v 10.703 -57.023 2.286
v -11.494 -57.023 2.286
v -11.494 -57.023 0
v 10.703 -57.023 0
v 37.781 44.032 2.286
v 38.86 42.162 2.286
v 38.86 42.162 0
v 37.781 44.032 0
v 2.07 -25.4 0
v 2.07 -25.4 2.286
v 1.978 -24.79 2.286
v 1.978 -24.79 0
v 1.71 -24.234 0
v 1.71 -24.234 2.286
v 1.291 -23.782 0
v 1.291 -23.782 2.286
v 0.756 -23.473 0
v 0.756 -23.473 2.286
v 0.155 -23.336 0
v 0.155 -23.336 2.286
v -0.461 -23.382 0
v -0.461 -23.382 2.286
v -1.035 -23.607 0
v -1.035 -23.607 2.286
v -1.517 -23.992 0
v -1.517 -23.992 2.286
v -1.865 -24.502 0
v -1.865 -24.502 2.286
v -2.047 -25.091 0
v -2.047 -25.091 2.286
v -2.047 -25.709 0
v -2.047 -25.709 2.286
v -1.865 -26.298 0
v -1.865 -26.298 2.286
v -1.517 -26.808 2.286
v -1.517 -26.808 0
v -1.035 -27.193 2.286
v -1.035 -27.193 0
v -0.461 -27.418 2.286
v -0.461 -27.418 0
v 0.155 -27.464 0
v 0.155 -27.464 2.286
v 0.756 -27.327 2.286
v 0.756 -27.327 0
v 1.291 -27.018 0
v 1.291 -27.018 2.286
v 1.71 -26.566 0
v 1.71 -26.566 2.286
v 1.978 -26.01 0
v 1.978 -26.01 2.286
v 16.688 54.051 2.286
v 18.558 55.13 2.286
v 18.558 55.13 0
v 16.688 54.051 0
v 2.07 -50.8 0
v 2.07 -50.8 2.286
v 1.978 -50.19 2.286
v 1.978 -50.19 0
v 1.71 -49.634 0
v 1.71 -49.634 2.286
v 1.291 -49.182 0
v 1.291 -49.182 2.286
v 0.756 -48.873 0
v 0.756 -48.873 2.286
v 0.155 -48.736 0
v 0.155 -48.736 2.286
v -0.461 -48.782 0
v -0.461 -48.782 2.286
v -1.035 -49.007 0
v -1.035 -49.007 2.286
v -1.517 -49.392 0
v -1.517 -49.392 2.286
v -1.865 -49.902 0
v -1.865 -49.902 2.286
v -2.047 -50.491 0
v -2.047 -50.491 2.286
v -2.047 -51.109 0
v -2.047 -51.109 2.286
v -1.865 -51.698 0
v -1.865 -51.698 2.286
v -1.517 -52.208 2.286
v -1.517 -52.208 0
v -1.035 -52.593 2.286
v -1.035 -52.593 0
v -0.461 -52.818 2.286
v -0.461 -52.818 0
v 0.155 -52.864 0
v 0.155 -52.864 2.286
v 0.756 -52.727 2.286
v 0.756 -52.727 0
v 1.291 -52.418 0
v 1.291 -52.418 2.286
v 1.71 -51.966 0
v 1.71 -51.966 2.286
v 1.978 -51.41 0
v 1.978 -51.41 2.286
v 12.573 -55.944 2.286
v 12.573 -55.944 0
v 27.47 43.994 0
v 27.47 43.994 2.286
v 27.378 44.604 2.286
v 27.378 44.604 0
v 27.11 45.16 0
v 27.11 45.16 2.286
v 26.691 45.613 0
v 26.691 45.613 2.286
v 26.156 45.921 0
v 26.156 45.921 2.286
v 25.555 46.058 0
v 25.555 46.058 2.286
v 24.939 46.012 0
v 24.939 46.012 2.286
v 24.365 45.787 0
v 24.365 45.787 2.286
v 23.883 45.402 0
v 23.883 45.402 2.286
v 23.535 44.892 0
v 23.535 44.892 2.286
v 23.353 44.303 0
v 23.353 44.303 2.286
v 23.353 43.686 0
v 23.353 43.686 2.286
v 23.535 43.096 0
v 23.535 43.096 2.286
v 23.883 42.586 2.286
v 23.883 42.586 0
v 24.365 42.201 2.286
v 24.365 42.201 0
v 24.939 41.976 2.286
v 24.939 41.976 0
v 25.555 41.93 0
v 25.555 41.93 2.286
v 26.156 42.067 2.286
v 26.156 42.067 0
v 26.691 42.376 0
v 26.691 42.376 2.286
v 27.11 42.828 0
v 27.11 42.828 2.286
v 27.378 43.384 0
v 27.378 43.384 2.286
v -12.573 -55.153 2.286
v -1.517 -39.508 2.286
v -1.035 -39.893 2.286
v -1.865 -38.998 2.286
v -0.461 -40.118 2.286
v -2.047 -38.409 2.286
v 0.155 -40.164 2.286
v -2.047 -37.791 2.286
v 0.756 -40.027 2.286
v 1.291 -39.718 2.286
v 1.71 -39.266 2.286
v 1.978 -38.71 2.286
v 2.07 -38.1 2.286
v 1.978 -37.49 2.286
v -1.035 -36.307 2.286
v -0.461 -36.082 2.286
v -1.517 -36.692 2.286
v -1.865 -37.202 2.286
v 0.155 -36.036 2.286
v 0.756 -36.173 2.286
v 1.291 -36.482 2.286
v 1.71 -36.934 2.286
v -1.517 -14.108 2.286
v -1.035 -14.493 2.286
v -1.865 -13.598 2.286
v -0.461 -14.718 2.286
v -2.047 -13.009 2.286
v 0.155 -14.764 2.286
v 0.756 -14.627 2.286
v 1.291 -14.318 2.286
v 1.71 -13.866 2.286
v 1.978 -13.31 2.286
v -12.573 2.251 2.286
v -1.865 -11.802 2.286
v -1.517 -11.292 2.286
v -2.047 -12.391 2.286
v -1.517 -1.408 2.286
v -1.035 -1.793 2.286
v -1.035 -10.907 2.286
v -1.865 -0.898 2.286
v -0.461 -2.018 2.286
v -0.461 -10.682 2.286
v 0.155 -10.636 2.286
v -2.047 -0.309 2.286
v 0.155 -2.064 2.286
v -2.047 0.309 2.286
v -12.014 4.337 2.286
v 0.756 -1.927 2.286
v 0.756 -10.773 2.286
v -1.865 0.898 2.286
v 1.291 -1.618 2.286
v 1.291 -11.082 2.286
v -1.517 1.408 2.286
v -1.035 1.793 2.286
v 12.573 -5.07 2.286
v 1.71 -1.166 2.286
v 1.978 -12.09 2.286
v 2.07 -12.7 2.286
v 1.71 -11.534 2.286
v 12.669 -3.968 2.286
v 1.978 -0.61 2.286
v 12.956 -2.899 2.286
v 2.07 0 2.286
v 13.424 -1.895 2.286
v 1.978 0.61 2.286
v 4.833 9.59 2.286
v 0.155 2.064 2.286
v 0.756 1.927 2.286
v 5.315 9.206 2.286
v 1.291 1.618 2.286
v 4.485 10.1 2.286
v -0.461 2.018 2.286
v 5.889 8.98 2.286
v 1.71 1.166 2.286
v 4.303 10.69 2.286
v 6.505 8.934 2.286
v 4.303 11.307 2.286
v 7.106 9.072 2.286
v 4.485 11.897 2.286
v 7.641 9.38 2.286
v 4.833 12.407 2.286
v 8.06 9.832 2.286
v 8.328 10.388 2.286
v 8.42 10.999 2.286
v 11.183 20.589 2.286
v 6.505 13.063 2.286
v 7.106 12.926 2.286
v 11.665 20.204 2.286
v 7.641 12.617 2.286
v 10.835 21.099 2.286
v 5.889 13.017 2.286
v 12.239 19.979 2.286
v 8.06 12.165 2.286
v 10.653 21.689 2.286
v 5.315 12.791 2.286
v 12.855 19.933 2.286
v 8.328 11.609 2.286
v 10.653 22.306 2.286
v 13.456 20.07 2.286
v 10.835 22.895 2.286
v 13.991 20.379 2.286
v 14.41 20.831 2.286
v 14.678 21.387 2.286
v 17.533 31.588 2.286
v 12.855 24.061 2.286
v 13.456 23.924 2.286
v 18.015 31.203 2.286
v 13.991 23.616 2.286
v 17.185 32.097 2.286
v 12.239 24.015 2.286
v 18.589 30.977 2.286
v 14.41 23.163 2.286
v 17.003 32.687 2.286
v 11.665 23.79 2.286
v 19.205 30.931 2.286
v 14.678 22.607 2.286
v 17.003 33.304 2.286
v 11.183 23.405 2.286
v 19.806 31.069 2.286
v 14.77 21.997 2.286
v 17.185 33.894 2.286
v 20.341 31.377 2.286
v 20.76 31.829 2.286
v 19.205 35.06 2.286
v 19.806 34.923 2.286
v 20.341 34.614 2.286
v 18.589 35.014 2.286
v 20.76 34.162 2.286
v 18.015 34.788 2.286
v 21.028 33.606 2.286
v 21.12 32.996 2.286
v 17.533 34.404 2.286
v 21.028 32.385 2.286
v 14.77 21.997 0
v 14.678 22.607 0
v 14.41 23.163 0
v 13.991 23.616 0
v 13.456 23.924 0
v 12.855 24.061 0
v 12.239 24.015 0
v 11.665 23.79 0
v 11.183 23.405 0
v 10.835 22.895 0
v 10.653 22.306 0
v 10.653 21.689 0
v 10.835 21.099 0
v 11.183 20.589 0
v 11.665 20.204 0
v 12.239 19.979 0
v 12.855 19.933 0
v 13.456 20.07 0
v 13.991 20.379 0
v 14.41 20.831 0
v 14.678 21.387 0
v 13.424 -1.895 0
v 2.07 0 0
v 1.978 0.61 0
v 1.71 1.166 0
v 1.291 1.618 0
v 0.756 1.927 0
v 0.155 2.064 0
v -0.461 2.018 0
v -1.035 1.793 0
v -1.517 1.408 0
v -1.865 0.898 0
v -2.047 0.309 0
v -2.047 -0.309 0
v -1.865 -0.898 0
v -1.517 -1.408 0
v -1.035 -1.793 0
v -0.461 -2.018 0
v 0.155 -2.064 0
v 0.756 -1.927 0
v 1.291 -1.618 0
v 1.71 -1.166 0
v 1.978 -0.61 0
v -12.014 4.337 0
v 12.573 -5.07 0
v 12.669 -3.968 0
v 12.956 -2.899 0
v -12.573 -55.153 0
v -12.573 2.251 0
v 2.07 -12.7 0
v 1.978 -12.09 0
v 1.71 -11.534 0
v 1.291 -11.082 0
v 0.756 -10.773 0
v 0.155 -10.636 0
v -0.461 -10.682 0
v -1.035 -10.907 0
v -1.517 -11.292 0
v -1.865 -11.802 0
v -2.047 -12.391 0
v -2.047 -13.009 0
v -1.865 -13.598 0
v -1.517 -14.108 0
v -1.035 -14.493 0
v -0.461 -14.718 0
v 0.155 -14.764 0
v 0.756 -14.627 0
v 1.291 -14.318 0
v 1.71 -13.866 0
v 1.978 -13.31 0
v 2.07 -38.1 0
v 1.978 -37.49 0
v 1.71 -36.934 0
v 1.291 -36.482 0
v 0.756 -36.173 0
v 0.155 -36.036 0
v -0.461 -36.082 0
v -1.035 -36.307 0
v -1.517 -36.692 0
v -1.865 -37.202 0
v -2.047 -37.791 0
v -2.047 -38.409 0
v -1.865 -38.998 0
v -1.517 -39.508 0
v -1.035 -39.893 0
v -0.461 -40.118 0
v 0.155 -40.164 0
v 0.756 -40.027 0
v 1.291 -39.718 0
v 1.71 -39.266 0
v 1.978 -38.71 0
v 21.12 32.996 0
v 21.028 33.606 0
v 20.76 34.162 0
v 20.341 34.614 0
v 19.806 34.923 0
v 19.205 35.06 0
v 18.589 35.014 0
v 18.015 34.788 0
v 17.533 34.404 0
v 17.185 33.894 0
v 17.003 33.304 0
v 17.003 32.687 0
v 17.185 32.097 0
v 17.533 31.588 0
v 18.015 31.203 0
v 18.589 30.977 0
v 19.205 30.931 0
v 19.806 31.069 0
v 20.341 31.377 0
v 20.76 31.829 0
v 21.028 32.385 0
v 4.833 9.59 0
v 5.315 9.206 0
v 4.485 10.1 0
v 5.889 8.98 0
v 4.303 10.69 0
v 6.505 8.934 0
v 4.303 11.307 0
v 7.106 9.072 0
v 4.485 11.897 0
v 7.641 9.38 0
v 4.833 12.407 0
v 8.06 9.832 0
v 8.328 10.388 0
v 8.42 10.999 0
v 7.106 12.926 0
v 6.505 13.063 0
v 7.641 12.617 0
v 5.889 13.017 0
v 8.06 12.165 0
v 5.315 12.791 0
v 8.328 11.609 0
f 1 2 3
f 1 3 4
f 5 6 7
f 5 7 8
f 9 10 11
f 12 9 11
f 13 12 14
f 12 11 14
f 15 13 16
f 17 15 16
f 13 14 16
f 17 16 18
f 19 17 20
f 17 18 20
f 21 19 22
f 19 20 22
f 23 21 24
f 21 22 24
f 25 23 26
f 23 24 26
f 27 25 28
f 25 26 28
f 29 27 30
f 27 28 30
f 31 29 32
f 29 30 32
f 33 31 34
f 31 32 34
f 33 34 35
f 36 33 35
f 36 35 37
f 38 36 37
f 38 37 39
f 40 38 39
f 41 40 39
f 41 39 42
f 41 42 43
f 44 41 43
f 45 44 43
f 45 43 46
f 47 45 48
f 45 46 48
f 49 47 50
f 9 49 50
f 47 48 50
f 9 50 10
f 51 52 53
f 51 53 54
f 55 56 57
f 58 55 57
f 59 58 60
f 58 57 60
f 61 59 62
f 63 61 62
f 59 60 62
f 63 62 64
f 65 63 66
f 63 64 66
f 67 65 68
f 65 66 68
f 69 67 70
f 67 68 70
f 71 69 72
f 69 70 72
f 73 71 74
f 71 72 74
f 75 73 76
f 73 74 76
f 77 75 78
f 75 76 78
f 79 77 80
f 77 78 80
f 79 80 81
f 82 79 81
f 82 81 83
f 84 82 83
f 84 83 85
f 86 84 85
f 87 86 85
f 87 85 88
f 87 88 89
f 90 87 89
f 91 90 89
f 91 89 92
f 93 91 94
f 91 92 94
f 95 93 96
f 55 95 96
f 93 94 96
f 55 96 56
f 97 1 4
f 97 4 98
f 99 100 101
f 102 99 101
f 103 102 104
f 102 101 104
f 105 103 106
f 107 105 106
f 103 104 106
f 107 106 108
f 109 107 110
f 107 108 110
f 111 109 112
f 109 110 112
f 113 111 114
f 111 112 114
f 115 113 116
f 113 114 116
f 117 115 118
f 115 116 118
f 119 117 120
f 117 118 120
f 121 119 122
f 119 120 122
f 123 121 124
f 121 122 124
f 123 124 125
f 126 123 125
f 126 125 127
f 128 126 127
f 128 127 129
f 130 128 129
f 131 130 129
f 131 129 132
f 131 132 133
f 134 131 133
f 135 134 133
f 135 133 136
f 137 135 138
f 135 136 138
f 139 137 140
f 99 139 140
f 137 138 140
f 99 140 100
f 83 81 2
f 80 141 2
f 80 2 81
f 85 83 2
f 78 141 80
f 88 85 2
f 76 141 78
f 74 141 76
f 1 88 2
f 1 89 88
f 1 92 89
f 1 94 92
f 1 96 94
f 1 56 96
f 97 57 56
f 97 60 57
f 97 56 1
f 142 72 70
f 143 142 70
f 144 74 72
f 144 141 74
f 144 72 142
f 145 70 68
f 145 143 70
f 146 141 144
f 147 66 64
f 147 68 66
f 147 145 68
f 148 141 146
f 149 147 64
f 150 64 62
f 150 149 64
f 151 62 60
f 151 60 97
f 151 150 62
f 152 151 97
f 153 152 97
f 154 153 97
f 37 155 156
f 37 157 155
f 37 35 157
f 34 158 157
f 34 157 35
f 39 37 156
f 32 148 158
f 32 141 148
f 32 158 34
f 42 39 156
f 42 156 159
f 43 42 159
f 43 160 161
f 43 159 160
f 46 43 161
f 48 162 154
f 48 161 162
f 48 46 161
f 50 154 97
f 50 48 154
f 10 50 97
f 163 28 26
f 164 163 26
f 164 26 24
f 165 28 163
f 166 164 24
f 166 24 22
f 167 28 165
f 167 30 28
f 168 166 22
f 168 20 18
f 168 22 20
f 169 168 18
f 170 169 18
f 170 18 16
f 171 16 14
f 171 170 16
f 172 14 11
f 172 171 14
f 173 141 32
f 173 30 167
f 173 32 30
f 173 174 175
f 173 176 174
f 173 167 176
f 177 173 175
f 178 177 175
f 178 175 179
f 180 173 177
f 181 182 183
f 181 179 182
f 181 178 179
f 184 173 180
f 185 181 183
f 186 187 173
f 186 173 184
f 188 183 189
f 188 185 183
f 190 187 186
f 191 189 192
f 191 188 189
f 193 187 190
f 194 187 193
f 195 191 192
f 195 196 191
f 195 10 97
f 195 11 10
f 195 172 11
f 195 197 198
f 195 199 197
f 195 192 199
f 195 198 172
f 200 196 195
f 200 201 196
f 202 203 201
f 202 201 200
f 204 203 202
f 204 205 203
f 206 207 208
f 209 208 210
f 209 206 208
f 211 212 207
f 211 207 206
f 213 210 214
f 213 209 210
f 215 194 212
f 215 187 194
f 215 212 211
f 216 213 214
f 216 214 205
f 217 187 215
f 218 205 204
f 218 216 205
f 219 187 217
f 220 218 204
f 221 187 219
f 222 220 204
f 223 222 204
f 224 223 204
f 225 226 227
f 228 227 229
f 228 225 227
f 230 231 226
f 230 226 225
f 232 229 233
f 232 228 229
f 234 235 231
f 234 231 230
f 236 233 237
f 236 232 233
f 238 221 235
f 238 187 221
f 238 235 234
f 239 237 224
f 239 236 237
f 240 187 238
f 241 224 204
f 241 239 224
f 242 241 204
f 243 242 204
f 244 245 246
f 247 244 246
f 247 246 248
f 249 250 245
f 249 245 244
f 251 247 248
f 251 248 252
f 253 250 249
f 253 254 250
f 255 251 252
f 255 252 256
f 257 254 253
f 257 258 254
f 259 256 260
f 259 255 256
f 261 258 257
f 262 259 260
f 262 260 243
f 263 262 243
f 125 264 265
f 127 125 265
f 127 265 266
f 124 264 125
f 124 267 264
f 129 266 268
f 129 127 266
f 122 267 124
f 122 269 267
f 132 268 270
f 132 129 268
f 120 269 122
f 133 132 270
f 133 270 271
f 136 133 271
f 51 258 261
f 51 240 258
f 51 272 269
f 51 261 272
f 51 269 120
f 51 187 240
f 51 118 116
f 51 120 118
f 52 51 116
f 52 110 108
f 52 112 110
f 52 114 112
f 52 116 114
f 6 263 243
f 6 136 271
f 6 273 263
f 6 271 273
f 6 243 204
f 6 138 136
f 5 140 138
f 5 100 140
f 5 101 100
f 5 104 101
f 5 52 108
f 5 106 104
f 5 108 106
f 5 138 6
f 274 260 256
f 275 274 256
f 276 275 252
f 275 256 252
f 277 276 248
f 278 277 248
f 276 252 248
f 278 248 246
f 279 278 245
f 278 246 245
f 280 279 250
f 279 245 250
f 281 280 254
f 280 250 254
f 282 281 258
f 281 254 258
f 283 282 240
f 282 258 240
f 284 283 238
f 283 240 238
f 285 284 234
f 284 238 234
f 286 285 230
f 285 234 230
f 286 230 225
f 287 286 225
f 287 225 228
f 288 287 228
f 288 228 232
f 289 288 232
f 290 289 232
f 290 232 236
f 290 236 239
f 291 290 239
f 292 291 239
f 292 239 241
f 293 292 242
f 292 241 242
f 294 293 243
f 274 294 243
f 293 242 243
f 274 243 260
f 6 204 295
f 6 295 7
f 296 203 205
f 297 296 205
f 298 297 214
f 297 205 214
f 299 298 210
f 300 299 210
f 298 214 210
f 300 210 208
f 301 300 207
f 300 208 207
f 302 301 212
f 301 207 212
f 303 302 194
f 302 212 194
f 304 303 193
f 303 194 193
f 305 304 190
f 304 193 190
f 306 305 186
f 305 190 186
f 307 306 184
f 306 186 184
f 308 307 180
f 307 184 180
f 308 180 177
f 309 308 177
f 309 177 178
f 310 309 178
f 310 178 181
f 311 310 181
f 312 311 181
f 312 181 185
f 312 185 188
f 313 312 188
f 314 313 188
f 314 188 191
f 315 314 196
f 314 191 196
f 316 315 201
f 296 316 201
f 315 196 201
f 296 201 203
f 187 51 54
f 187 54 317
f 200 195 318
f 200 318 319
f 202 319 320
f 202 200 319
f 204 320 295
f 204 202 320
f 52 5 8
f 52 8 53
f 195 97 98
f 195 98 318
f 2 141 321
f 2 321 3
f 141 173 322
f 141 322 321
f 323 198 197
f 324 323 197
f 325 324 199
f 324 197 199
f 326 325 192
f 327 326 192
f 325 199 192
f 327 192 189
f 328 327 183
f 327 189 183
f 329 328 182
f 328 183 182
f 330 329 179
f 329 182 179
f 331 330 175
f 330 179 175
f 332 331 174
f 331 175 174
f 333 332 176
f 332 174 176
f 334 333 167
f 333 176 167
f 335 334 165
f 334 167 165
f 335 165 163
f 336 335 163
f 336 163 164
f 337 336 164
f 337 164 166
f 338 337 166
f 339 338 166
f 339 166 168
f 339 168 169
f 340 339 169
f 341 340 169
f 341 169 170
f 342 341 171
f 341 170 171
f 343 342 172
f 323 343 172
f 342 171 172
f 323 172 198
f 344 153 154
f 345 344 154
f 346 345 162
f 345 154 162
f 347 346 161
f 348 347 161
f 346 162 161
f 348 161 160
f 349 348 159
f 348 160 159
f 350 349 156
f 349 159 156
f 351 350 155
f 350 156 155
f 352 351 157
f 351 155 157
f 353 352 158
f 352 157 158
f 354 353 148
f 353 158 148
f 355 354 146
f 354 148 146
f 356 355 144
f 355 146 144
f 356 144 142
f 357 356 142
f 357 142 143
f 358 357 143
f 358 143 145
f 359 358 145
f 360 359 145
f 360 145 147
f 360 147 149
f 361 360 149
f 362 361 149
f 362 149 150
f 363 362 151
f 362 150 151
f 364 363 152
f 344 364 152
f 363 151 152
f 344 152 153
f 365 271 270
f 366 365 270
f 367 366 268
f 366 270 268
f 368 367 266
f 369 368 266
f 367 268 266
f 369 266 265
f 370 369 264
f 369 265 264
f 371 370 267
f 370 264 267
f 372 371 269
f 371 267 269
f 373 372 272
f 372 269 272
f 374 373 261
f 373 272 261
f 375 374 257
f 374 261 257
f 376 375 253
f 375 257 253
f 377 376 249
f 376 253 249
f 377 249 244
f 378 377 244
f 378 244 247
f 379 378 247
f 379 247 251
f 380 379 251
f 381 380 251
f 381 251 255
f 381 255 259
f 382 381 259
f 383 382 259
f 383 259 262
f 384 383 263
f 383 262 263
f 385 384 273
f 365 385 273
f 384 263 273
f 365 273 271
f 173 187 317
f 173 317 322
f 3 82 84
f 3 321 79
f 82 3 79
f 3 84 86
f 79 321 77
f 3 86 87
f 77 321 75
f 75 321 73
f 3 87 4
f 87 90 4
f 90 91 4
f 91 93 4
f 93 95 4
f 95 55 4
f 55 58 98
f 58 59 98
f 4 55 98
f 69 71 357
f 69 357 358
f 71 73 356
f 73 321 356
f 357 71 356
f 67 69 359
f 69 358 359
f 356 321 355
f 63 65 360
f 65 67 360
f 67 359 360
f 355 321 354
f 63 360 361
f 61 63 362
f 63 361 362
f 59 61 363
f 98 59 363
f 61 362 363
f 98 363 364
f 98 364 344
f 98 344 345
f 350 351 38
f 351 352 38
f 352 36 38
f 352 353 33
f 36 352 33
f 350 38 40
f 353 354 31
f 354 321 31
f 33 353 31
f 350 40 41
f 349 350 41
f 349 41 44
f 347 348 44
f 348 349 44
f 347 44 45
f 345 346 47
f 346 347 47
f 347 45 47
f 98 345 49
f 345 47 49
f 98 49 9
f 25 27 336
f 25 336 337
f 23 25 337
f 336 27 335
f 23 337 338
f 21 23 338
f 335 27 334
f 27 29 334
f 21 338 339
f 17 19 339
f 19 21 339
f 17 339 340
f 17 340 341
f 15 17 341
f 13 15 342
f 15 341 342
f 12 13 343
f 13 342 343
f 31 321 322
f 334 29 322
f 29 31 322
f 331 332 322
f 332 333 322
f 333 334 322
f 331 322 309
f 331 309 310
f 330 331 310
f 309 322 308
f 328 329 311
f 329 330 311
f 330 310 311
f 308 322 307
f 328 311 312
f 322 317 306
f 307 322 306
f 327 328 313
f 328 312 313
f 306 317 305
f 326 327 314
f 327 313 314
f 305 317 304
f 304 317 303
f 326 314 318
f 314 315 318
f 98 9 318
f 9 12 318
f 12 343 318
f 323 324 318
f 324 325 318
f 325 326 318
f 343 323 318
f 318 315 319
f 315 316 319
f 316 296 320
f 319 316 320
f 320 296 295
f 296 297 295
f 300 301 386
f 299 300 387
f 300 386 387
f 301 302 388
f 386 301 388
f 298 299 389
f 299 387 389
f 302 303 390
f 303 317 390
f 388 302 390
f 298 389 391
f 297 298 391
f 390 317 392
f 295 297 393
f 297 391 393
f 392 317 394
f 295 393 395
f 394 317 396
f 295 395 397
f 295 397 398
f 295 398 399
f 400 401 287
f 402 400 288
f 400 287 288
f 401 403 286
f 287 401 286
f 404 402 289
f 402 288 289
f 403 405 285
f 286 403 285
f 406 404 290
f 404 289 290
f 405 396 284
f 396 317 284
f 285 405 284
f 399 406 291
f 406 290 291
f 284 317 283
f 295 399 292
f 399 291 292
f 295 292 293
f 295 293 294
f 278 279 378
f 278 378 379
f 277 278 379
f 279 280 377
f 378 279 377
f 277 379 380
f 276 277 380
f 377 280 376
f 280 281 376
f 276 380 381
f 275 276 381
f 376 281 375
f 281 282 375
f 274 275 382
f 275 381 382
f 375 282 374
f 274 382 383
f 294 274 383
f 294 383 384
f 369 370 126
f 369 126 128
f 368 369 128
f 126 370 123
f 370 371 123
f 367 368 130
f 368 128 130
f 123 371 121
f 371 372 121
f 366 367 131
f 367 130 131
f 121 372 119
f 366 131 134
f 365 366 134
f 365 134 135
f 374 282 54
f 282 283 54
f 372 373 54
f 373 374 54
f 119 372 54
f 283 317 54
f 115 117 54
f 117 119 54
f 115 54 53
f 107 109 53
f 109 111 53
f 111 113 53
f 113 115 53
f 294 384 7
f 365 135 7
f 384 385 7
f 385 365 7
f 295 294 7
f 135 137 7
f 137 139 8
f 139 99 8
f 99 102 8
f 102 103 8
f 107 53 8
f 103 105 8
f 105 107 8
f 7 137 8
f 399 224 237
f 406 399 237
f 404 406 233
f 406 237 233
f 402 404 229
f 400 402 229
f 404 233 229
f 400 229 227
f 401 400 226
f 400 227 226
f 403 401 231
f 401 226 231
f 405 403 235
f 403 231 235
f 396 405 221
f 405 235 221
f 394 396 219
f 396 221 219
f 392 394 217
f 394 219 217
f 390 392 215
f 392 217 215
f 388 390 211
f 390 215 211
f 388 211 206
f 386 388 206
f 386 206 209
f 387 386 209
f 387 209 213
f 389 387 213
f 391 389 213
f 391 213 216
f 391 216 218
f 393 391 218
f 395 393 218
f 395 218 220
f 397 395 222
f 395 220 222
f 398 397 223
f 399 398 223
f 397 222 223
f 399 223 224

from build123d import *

# Parameters (mm, degrees)
SKETCH1_R           = 2.0701
BOSS_EXTRUDE1_DEPTH = 2.286


with BuildPart() as part:
    # Sketch1 → Boss-Extrude1 (new body)
    with BuildSketch(Plane.XY.offset(2.286)):
        with BuildLine():
            Line((16.688088175, 54.0506166), (-12.014209682, 4.336778419))
            Line((-12.014209682, 4.336778419), (-12.573, 2.25134456))
            Line((-12.573, 2.25134456), (-12.573, -55.153251153))
            Line((-12.573, -55.153251153), (-11.4935, -57.023))
            Line((-11.4935, -57.023), (10.703251153, -57.023))
            Line((10.703251153, -57.023), (12.573, -55.9435))
            Line((12.573, -55.9435), (12.573, -5.070402568))
            ThreePointArc((12.573, -5.070402568), (12.789371003, -3.426901632), (13.423738686, -1.895402568))
            Line((13.423738686, -1.895402568), (38.860287402, 42.161992177))
            Line((38.860287402, 42.161992177), (37.780787402, 44.031741023))
            Line((37.780787402, 44.031741023), (18.557837022, 55.1301166))
            Line((18.557837022, 55.1301166), (16.688088175, 54.0506166))
        make_face()
        Circle(SKETCH1_R, mode=Mode.SUBTRACT)
        with Locations((0, -38.1)):
            Circle(SKETCH1_R, mode=Mode.SUBTRACT)
        with Locations((0, -12.7)):
            Circle(SKETCH1_R, mode=Mode.SUBTRACT)
        with Locations((0, -25.4)):
            Circle(SKETCH1_R, mode=Mode.SUBTRACT)
        with Locations((0, -50.8)):
            Circle(SKETCH1_R, mode=Mode.SUBTRACT)
        with Locations((19.05, 32.995567884)):
            Circle(SKETCH1_R, mode=Mode.SUBTRACT)
        with Locations((6.35, 10.998522628)):
            Circle(SKETCH1_R, mode=Mode.SUBTRACT)
        with Locations((12.7, 21.997045256)):
            Circle(SKETCH1_R, mode=Mode.SUBTRACT)
        with Locations((25.4, 43.994090512)):
            Circle(SKETCH1_R, mode=Mode.SUBTRACT)
    extrude(amount=-BOSS_EXTRUDE1_DEPTH)


solid = part.part
